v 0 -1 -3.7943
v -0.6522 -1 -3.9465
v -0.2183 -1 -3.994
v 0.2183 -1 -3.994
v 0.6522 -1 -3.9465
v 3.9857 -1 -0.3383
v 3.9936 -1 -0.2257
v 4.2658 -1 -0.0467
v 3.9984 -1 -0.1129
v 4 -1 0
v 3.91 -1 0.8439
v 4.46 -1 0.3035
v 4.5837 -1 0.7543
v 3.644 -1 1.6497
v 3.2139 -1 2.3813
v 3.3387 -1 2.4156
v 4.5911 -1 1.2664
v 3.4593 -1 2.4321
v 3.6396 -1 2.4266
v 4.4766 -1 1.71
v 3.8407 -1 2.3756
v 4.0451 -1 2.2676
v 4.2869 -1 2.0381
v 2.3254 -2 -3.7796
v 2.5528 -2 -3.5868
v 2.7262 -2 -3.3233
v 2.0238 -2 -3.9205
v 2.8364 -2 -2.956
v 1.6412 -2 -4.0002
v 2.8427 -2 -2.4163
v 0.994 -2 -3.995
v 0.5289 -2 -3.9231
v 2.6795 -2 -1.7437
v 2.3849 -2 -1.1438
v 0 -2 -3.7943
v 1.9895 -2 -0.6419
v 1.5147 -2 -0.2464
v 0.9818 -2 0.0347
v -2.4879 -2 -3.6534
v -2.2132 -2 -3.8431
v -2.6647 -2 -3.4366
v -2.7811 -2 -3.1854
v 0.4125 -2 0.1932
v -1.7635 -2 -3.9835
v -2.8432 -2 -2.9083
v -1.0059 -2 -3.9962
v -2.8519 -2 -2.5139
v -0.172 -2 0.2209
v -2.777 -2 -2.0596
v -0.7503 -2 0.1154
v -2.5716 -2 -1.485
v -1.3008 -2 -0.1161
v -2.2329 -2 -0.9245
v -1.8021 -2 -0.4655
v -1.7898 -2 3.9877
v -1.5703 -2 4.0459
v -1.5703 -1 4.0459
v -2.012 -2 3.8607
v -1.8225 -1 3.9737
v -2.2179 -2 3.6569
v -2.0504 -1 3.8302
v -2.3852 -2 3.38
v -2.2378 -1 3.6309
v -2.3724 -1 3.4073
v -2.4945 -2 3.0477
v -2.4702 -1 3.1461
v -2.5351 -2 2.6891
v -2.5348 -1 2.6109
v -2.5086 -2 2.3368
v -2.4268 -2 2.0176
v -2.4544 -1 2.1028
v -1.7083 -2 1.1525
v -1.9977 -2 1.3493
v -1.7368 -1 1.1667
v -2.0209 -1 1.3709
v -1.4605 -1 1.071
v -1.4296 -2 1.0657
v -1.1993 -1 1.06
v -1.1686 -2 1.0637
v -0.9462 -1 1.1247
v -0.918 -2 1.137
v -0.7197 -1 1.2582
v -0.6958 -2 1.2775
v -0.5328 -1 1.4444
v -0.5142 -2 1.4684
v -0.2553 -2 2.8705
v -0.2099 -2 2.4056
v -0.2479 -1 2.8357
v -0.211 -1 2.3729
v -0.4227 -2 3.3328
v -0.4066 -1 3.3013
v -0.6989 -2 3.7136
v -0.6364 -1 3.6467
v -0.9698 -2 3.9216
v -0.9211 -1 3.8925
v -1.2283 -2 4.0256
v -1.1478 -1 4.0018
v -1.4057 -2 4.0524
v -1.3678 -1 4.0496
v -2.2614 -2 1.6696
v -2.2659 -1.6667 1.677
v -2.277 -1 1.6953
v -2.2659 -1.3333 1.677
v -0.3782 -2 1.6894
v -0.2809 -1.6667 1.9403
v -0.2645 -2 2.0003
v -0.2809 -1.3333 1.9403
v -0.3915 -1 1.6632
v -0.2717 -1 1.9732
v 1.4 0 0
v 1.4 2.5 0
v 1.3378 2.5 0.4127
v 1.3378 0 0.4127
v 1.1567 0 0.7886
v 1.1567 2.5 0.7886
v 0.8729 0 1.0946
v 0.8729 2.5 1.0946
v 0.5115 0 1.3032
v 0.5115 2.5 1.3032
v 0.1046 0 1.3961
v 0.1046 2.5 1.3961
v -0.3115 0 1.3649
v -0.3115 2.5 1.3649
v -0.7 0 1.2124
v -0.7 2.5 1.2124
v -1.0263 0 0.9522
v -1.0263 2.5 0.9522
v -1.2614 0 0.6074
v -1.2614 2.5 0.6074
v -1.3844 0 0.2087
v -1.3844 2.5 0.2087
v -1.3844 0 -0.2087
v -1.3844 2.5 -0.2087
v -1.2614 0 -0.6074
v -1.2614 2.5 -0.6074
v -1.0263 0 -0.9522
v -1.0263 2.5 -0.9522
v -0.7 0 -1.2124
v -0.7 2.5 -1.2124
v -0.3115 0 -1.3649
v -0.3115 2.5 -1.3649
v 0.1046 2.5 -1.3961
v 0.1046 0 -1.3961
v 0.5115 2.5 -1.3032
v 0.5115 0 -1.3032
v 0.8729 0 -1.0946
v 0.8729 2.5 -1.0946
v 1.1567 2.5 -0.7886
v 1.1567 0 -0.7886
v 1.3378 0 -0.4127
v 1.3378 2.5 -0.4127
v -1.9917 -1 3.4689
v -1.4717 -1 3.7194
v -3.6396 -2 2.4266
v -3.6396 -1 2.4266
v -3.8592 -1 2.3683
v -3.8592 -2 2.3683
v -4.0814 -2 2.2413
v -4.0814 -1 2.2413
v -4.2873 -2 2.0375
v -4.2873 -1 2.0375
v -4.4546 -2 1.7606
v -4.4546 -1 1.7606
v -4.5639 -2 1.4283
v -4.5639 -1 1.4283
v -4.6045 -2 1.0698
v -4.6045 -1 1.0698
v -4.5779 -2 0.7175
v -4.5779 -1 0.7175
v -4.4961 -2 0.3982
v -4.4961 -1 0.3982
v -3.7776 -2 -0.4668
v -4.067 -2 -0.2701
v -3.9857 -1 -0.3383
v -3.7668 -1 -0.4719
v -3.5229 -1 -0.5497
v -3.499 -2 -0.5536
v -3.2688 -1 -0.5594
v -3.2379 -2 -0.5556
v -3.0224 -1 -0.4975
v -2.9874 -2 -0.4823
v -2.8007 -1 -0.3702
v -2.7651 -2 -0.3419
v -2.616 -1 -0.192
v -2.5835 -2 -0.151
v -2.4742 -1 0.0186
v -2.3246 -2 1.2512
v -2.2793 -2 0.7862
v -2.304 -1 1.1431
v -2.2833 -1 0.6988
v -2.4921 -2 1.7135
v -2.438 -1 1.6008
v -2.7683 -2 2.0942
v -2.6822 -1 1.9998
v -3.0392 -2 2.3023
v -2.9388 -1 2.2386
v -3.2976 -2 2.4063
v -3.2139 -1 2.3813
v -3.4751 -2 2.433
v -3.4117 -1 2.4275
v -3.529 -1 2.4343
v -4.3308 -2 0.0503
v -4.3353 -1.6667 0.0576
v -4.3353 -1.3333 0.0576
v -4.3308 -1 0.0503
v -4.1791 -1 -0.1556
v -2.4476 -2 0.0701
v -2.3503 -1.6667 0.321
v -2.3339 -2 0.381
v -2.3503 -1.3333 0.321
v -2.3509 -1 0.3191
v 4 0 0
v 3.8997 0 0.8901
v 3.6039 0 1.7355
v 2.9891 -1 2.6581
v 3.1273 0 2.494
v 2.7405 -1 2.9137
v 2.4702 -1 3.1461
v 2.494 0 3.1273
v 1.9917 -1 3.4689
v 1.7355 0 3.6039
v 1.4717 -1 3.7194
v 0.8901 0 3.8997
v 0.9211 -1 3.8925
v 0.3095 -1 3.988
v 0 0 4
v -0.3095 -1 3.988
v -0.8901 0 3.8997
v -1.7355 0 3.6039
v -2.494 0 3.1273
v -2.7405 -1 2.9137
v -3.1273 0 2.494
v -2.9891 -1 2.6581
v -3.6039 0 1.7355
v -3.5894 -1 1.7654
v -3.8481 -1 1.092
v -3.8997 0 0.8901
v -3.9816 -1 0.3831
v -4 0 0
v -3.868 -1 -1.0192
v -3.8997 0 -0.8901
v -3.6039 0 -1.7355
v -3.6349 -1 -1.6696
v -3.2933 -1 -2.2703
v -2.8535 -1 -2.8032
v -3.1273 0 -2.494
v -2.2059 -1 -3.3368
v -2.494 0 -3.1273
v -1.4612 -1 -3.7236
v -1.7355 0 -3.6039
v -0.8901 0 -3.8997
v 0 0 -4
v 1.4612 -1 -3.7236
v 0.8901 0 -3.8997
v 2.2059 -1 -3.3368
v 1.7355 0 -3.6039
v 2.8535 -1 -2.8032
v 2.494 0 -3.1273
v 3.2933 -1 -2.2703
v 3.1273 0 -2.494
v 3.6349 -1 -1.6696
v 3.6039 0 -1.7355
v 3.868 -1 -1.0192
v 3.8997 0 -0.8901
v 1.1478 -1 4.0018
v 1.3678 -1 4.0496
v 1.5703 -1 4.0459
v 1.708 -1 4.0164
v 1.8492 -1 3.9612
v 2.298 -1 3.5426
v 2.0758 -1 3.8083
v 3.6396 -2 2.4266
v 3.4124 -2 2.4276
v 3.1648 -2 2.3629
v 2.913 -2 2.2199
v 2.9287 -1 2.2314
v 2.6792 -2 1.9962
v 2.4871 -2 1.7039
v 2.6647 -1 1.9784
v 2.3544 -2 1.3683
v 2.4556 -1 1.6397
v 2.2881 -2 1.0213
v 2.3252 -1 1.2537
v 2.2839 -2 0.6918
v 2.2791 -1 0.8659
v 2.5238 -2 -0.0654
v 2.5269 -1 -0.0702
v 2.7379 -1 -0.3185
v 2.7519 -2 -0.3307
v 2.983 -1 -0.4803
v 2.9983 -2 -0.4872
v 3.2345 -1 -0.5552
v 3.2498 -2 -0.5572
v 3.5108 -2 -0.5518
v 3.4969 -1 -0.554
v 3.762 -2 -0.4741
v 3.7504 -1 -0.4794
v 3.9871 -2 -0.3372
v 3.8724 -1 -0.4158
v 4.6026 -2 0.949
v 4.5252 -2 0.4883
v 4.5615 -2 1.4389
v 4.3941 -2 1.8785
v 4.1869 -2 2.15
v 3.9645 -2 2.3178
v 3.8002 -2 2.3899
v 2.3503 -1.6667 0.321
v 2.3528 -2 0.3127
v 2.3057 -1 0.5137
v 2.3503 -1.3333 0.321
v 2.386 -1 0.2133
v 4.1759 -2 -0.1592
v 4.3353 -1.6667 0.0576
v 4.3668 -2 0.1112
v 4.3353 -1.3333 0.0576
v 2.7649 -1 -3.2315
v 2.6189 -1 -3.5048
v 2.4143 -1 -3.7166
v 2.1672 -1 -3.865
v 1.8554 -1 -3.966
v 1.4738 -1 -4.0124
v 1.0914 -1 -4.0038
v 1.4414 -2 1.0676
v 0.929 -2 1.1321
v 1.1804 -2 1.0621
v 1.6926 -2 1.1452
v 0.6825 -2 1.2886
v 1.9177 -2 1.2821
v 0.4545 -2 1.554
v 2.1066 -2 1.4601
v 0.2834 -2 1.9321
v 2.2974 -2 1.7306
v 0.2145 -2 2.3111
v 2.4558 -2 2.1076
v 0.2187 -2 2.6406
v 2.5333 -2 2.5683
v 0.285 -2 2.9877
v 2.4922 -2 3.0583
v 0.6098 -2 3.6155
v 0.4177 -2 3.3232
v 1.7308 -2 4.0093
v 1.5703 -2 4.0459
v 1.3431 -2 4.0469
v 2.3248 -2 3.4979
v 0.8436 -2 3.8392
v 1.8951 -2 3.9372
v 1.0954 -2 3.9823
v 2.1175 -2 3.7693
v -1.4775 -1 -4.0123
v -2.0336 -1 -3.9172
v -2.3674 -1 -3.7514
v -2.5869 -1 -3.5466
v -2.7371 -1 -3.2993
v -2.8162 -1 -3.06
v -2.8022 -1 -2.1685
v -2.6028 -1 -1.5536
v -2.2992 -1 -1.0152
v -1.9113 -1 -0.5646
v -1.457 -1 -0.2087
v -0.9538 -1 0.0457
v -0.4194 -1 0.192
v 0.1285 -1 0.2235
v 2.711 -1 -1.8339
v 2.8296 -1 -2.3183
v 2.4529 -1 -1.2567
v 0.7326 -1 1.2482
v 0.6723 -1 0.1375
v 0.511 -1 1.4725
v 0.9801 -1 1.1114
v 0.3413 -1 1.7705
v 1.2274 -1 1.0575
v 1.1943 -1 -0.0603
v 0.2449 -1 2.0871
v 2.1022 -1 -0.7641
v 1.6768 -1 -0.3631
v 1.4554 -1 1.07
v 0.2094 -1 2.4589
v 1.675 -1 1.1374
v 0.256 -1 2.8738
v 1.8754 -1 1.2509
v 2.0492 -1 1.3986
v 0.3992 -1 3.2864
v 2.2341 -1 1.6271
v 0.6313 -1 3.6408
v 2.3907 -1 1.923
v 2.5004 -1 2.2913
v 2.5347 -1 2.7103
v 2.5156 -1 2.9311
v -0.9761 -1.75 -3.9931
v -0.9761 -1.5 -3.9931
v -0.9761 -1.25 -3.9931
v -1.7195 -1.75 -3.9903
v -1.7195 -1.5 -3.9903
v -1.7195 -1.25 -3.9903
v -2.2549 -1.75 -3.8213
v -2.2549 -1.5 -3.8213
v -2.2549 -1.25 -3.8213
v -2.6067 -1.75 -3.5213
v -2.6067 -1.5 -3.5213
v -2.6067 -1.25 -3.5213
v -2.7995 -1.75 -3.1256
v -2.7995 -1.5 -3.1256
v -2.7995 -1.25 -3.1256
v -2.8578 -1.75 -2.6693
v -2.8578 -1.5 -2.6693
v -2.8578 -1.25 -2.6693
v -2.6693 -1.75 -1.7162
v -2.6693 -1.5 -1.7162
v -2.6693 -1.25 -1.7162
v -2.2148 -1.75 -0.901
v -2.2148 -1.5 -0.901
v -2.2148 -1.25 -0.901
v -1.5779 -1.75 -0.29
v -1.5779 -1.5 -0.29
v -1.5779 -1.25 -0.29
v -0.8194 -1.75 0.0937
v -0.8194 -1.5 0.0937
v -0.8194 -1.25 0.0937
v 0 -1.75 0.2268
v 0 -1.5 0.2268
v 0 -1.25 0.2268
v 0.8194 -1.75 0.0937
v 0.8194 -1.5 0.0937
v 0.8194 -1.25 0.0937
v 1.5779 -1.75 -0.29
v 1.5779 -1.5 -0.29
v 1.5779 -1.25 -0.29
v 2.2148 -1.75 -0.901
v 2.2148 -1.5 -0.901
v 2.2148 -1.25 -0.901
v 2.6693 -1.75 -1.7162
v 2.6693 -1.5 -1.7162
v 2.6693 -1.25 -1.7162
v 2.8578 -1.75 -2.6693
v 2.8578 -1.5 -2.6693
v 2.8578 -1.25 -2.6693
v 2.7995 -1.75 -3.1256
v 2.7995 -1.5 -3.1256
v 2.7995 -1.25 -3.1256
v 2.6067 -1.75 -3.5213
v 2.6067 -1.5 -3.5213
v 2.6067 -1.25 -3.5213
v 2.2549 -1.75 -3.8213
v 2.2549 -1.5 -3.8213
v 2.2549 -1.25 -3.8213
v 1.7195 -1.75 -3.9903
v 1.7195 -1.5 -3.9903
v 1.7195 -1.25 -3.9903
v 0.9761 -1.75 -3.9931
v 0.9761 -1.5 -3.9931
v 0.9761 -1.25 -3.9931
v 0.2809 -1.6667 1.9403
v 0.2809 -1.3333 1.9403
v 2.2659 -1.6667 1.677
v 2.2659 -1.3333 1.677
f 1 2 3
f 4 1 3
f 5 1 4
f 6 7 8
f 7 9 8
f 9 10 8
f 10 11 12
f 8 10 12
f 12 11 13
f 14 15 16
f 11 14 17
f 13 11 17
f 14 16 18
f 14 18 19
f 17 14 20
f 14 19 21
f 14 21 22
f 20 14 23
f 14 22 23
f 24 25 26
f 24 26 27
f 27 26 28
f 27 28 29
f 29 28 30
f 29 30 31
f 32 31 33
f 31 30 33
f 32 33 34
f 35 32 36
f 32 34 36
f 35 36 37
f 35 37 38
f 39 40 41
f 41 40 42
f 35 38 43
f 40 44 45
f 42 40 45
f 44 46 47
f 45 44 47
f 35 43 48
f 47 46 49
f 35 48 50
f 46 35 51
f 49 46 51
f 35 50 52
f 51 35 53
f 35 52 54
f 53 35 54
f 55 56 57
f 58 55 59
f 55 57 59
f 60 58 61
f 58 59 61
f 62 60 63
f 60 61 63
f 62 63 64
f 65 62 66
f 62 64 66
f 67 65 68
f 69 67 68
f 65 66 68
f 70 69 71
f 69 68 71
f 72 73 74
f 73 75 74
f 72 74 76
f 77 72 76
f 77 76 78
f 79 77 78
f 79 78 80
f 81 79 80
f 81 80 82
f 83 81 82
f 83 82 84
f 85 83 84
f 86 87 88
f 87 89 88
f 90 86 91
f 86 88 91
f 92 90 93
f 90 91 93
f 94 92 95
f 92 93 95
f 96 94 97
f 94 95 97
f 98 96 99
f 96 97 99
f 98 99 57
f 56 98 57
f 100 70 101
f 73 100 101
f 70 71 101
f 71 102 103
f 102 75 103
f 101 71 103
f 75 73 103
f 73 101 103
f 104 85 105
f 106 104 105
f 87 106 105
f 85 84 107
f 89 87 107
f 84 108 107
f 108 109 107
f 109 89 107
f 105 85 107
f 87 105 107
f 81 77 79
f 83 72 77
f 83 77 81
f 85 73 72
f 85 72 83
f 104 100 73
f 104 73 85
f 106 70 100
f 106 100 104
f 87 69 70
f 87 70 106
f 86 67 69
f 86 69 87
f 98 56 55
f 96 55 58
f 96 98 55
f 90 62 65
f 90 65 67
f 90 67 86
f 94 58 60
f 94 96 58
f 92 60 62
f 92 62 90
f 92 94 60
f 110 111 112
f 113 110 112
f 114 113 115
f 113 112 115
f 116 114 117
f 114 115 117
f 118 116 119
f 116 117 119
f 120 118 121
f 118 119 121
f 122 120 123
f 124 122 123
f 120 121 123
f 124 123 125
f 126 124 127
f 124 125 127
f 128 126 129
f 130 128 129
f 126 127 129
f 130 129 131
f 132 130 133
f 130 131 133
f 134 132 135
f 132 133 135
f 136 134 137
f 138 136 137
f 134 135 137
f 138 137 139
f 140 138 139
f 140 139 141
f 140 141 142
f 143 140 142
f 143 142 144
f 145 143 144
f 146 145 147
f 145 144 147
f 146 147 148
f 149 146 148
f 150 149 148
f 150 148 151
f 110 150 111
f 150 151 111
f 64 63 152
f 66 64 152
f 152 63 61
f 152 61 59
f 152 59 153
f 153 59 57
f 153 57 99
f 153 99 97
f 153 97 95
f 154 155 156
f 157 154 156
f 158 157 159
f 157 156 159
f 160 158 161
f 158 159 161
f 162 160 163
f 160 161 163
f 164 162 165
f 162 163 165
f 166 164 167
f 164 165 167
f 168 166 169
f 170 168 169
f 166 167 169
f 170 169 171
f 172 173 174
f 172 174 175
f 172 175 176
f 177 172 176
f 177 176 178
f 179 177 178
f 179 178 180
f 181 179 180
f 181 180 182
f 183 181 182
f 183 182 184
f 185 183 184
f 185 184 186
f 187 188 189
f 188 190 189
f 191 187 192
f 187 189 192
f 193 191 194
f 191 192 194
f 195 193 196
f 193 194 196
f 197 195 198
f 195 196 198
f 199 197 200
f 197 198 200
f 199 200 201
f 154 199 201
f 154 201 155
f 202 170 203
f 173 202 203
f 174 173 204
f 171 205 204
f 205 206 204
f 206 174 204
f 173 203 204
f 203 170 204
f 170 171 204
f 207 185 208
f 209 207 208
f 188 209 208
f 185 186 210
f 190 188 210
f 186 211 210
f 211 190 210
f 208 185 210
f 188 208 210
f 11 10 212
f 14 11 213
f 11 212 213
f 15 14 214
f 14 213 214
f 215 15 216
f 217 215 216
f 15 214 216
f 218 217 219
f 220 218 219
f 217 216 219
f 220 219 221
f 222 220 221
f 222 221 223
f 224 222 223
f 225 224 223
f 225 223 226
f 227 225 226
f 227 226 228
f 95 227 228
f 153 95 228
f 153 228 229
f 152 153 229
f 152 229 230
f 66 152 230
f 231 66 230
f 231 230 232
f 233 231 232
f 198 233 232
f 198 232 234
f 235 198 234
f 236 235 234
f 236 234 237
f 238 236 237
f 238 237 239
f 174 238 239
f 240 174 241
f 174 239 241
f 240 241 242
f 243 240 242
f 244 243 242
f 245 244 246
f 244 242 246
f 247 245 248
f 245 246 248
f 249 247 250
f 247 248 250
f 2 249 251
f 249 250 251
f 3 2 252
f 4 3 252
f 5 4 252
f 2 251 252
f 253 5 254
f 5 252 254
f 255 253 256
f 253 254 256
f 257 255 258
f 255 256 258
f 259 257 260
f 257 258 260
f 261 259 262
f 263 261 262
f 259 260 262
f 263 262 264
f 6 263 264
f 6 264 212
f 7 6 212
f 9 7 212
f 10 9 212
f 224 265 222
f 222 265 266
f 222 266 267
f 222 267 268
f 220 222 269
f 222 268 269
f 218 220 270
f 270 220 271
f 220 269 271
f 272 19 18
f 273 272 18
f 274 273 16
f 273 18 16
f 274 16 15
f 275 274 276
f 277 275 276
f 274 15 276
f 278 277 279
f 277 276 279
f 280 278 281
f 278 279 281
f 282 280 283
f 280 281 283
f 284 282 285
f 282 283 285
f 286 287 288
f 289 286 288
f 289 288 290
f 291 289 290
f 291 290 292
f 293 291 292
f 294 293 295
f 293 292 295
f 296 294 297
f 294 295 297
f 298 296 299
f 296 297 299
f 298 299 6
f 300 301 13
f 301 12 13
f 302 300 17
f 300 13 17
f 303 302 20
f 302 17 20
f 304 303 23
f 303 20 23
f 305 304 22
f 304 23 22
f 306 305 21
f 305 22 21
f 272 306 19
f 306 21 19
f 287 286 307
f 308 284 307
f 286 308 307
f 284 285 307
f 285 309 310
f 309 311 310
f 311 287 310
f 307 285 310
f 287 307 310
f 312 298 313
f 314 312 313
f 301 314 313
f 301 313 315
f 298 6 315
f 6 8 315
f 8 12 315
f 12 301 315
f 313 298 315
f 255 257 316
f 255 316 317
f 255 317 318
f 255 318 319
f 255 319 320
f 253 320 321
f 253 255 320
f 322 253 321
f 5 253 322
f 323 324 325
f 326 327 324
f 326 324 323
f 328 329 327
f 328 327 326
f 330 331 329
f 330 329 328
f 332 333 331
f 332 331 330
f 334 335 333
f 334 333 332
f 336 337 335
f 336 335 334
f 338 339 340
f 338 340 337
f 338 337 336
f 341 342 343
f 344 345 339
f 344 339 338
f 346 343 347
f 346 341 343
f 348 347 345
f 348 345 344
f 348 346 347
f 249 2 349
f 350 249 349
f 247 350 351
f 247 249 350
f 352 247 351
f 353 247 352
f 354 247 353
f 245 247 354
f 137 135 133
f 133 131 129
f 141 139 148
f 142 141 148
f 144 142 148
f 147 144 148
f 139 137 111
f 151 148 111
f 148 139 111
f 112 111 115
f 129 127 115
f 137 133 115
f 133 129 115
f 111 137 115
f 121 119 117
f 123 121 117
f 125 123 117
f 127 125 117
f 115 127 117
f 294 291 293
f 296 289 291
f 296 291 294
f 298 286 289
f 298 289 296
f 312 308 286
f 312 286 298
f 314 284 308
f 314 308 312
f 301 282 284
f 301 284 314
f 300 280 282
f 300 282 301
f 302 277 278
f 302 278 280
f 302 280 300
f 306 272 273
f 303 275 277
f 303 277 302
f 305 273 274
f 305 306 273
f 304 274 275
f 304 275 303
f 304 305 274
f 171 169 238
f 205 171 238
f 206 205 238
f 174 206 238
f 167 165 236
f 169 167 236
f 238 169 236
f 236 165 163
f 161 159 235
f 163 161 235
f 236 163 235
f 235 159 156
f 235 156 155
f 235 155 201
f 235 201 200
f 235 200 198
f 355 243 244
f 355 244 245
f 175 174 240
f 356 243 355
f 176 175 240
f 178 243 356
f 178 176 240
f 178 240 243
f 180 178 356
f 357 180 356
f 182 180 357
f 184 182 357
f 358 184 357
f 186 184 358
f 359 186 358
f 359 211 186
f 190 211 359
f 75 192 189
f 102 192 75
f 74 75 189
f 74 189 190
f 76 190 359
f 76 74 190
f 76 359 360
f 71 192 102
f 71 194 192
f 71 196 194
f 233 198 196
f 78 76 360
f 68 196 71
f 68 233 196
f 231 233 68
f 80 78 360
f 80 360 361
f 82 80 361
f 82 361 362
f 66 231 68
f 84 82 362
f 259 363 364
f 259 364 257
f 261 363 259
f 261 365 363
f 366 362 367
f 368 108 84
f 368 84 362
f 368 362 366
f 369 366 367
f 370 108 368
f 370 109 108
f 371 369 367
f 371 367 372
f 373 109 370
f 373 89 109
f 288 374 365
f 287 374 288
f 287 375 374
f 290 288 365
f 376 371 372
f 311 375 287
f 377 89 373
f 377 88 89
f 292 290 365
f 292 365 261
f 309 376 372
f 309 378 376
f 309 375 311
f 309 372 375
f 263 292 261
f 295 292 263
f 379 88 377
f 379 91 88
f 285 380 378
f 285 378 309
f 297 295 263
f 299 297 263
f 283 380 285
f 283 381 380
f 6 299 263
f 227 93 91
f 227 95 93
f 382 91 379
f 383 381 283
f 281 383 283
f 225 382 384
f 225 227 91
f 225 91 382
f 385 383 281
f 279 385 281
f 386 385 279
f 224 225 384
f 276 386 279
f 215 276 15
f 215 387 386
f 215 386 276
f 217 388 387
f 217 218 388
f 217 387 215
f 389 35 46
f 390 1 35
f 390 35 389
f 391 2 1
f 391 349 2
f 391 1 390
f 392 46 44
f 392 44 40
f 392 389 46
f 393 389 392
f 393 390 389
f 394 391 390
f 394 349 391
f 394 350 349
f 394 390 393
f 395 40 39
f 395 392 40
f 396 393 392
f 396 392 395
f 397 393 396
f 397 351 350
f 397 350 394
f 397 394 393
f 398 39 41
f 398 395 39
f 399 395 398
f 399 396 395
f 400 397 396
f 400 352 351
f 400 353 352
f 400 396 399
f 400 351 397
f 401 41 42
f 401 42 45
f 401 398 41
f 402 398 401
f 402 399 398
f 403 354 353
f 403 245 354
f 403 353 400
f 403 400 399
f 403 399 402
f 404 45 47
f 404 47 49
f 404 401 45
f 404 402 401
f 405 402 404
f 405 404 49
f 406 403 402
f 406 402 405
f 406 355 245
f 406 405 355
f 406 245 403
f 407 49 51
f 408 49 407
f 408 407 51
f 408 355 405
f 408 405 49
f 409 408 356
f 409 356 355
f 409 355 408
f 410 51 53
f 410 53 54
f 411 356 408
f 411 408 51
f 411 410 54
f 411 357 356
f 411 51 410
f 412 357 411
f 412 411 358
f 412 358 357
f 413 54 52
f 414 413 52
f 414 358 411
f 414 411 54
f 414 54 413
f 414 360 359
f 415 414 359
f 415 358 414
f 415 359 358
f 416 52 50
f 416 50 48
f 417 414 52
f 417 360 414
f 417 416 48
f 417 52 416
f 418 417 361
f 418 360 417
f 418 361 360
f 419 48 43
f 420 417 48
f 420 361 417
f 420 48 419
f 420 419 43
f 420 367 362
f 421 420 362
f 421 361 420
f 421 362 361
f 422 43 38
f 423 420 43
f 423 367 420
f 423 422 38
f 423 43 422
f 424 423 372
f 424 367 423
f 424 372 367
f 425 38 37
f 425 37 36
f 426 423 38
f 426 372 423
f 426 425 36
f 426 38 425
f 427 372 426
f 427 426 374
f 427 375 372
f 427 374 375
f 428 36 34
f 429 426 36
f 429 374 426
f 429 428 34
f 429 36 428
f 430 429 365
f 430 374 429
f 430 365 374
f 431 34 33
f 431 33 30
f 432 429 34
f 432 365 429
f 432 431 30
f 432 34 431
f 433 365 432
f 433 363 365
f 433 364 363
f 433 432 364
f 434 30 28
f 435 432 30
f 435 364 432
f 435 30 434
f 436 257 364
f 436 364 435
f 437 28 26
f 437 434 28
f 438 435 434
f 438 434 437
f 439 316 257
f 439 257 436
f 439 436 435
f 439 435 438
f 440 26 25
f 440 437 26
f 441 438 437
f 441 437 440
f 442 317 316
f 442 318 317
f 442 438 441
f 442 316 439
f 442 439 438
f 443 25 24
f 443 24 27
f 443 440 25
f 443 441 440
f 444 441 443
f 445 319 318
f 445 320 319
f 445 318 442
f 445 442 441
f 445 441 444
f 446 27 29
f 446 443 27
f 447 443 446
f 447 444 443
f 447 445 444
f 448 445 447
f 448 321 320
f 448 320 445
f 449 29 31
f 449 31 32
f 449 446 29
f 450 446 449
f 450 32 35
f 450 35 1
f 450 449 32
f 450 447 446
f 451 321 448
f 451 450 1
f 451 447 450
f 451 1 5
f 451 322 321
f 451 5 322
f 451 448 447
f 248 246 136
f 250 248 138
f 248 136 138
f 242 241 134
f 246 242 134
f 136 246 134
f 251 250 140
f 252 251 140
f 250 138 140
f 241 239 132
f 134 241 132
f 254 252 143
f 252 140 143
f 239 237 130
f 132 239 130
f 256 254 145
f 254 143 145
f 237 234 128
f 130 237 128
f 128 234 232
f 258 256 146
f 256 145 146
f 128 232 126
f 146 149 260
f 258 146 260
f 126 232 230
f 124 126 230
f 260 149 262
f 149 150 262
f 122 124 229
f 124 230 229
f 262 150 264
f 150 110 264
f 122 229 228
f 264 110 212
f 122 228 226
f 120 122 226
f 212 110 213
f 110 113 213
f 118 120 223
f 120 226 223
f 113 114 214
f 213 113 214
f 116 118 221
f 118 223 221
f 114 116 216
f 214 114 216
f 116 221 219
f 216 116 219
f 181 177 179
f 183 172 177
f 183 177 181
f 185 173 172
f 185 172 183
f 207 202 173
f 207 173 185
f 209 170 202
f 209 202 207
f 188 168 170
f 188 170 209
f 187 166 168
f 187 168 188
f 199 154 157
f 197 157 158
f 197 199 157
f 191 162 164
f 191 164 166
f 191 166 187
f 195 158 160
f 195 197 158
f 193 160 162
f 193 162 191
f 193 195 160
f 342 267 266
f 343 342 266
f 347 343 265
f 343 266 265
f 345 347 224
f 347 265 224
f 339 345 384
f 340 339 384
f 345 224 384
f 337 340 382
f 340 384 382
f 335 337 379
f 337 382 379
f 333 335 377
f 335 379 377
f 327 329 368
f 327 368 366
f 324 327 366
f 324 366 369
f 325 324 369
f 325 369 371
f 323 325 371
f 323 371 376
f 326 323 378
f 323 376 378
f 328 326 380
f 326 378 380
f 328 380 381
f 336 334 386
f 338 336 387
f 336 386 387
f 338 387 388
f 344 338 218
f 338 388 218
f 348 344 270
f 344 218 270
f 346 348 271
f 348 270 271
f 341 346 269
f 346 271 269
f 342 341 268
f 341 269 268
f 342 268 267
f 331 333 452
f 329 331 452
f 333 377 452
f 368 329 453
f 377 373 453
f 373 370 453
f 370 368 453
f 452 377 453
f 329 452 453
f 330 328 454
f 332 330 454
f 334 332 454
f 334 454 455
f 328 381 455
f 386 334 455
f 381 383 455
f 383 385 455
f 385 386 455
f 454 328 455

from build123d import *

# Parameters (mm, degrees)
CYLINDER003_R     = 1.4
CYLINDER003_DEPTH = 2.5
SKETCH031_R       = 4
PAD007_DEPTH      = 1
PAD008_DEPTH      = 1


with BuildPart() as part:
    # Cylinder003 → Cylinder003 (join)
    with BuildSketch(Plane.XZ.offset(-2.5)):
        Circle(CYLINDER003_R)
    extrude(amount=CYLINDER003_DEPTH)

    # Sketch031 → Pad007 (join)
    with BuildSketch(Plane.XZ):
        Circle(SKETCH031_R)
    extrude(amount=PAD007_DEPTH)

    # Sketch032 → Pad008 (join)
    with BuildSketch(Plane(origin=(0, -1, -0.5), x_dir=(1, 0, 0), z_dir=(0, -1, 0))):
        with BuildLine():
            add(Edge.make_bspline(
                [(-3.639625, 2.926563), (-5.624597, 2.663211), (-4.335286, 0.557627), (-3.045976, -1.547956), (-2.350315, 0.82098), (-1.654653, 3.189916), (-3.639625, 2.926563)],
                knots=[0, 0, 0, 2.094395, 2.094395, 4.18879, 4.18879, 6.283185, 6.283185, 6.283185], degree=2, weights=[1, 0.5, 1, 0.5, 1, 0.5, 1]))
        make_face()
        with BuildLine():
            add(Edge.make_bspline(
                [(0, -3.2943), (-2.934884, -4.124344), (-3.318071, -0.733701), (0, 1.456989), (3.318071, -0.733701), (2.934884, -4.124344), (0, -3.2943)],
                knots=[0, 0, 0, 0, 0.25, 0.5, 0.75, 1, 1, 1, 1], degree=3))
        make_face()
        with BuildLine():
            add(Edge.make_bspline(
                [(-1.570254, 4.545917), (-3.555226, 4.282565), (-2.265915, 2.176981), (-0.976605, 0.071398), (-0.280944, 2.440334), (0.414718, 4.80927), (-1.570254, 4.545917)],
                knots=[0, 0, 0, 2.094395, 2.094395, 4.18879, 4.18879, 6.283185, 6.283185, 6.283185], degree=2, weights=[1, 0.5, 1, 0.5, 1, 0.5, 1]))
        make_face()
        with BuildLine():
            add(Edge.make_bspline(
                [(1.570254, 4.545917), (-0.414718, 4.80927), (0.280944, 2.440334), (0.976605, 0.071398), (2.265915, 2.176981), (3.555226, 4.282565), (1.570254, 4.545917)],
                knots=[0, 0, 0, 2.094395, 2.094395, 4.18879, 4.18879, 6.283185, 6.283185, 6.283185], degree=2, weights=[1, 0.5, 1, 0.5, 1, 0.5, 1]))
        make_face()
        with BuildLine():
            add(Edge.make_bspline(
                [(3.639625, 2.926563), (1.654653, 3.189916), (2.350315, 0.82098), (3.045976, -1.547956), (4.335286, 0.557627), (5.624597, 2.663211), (3.639625, 2.926563)],
                knots=[0, 0, 0, 2.094395, 2.094395, 4.18879, 4.18879, 6.283185, 6.283185, 6.283185], degree=2, weights=[1, 0.5, 1, 0.5, 1, 0.5, 1]))
        make_face()
    extrude(amount=PAD008_DEPTH)


solid = part.part
